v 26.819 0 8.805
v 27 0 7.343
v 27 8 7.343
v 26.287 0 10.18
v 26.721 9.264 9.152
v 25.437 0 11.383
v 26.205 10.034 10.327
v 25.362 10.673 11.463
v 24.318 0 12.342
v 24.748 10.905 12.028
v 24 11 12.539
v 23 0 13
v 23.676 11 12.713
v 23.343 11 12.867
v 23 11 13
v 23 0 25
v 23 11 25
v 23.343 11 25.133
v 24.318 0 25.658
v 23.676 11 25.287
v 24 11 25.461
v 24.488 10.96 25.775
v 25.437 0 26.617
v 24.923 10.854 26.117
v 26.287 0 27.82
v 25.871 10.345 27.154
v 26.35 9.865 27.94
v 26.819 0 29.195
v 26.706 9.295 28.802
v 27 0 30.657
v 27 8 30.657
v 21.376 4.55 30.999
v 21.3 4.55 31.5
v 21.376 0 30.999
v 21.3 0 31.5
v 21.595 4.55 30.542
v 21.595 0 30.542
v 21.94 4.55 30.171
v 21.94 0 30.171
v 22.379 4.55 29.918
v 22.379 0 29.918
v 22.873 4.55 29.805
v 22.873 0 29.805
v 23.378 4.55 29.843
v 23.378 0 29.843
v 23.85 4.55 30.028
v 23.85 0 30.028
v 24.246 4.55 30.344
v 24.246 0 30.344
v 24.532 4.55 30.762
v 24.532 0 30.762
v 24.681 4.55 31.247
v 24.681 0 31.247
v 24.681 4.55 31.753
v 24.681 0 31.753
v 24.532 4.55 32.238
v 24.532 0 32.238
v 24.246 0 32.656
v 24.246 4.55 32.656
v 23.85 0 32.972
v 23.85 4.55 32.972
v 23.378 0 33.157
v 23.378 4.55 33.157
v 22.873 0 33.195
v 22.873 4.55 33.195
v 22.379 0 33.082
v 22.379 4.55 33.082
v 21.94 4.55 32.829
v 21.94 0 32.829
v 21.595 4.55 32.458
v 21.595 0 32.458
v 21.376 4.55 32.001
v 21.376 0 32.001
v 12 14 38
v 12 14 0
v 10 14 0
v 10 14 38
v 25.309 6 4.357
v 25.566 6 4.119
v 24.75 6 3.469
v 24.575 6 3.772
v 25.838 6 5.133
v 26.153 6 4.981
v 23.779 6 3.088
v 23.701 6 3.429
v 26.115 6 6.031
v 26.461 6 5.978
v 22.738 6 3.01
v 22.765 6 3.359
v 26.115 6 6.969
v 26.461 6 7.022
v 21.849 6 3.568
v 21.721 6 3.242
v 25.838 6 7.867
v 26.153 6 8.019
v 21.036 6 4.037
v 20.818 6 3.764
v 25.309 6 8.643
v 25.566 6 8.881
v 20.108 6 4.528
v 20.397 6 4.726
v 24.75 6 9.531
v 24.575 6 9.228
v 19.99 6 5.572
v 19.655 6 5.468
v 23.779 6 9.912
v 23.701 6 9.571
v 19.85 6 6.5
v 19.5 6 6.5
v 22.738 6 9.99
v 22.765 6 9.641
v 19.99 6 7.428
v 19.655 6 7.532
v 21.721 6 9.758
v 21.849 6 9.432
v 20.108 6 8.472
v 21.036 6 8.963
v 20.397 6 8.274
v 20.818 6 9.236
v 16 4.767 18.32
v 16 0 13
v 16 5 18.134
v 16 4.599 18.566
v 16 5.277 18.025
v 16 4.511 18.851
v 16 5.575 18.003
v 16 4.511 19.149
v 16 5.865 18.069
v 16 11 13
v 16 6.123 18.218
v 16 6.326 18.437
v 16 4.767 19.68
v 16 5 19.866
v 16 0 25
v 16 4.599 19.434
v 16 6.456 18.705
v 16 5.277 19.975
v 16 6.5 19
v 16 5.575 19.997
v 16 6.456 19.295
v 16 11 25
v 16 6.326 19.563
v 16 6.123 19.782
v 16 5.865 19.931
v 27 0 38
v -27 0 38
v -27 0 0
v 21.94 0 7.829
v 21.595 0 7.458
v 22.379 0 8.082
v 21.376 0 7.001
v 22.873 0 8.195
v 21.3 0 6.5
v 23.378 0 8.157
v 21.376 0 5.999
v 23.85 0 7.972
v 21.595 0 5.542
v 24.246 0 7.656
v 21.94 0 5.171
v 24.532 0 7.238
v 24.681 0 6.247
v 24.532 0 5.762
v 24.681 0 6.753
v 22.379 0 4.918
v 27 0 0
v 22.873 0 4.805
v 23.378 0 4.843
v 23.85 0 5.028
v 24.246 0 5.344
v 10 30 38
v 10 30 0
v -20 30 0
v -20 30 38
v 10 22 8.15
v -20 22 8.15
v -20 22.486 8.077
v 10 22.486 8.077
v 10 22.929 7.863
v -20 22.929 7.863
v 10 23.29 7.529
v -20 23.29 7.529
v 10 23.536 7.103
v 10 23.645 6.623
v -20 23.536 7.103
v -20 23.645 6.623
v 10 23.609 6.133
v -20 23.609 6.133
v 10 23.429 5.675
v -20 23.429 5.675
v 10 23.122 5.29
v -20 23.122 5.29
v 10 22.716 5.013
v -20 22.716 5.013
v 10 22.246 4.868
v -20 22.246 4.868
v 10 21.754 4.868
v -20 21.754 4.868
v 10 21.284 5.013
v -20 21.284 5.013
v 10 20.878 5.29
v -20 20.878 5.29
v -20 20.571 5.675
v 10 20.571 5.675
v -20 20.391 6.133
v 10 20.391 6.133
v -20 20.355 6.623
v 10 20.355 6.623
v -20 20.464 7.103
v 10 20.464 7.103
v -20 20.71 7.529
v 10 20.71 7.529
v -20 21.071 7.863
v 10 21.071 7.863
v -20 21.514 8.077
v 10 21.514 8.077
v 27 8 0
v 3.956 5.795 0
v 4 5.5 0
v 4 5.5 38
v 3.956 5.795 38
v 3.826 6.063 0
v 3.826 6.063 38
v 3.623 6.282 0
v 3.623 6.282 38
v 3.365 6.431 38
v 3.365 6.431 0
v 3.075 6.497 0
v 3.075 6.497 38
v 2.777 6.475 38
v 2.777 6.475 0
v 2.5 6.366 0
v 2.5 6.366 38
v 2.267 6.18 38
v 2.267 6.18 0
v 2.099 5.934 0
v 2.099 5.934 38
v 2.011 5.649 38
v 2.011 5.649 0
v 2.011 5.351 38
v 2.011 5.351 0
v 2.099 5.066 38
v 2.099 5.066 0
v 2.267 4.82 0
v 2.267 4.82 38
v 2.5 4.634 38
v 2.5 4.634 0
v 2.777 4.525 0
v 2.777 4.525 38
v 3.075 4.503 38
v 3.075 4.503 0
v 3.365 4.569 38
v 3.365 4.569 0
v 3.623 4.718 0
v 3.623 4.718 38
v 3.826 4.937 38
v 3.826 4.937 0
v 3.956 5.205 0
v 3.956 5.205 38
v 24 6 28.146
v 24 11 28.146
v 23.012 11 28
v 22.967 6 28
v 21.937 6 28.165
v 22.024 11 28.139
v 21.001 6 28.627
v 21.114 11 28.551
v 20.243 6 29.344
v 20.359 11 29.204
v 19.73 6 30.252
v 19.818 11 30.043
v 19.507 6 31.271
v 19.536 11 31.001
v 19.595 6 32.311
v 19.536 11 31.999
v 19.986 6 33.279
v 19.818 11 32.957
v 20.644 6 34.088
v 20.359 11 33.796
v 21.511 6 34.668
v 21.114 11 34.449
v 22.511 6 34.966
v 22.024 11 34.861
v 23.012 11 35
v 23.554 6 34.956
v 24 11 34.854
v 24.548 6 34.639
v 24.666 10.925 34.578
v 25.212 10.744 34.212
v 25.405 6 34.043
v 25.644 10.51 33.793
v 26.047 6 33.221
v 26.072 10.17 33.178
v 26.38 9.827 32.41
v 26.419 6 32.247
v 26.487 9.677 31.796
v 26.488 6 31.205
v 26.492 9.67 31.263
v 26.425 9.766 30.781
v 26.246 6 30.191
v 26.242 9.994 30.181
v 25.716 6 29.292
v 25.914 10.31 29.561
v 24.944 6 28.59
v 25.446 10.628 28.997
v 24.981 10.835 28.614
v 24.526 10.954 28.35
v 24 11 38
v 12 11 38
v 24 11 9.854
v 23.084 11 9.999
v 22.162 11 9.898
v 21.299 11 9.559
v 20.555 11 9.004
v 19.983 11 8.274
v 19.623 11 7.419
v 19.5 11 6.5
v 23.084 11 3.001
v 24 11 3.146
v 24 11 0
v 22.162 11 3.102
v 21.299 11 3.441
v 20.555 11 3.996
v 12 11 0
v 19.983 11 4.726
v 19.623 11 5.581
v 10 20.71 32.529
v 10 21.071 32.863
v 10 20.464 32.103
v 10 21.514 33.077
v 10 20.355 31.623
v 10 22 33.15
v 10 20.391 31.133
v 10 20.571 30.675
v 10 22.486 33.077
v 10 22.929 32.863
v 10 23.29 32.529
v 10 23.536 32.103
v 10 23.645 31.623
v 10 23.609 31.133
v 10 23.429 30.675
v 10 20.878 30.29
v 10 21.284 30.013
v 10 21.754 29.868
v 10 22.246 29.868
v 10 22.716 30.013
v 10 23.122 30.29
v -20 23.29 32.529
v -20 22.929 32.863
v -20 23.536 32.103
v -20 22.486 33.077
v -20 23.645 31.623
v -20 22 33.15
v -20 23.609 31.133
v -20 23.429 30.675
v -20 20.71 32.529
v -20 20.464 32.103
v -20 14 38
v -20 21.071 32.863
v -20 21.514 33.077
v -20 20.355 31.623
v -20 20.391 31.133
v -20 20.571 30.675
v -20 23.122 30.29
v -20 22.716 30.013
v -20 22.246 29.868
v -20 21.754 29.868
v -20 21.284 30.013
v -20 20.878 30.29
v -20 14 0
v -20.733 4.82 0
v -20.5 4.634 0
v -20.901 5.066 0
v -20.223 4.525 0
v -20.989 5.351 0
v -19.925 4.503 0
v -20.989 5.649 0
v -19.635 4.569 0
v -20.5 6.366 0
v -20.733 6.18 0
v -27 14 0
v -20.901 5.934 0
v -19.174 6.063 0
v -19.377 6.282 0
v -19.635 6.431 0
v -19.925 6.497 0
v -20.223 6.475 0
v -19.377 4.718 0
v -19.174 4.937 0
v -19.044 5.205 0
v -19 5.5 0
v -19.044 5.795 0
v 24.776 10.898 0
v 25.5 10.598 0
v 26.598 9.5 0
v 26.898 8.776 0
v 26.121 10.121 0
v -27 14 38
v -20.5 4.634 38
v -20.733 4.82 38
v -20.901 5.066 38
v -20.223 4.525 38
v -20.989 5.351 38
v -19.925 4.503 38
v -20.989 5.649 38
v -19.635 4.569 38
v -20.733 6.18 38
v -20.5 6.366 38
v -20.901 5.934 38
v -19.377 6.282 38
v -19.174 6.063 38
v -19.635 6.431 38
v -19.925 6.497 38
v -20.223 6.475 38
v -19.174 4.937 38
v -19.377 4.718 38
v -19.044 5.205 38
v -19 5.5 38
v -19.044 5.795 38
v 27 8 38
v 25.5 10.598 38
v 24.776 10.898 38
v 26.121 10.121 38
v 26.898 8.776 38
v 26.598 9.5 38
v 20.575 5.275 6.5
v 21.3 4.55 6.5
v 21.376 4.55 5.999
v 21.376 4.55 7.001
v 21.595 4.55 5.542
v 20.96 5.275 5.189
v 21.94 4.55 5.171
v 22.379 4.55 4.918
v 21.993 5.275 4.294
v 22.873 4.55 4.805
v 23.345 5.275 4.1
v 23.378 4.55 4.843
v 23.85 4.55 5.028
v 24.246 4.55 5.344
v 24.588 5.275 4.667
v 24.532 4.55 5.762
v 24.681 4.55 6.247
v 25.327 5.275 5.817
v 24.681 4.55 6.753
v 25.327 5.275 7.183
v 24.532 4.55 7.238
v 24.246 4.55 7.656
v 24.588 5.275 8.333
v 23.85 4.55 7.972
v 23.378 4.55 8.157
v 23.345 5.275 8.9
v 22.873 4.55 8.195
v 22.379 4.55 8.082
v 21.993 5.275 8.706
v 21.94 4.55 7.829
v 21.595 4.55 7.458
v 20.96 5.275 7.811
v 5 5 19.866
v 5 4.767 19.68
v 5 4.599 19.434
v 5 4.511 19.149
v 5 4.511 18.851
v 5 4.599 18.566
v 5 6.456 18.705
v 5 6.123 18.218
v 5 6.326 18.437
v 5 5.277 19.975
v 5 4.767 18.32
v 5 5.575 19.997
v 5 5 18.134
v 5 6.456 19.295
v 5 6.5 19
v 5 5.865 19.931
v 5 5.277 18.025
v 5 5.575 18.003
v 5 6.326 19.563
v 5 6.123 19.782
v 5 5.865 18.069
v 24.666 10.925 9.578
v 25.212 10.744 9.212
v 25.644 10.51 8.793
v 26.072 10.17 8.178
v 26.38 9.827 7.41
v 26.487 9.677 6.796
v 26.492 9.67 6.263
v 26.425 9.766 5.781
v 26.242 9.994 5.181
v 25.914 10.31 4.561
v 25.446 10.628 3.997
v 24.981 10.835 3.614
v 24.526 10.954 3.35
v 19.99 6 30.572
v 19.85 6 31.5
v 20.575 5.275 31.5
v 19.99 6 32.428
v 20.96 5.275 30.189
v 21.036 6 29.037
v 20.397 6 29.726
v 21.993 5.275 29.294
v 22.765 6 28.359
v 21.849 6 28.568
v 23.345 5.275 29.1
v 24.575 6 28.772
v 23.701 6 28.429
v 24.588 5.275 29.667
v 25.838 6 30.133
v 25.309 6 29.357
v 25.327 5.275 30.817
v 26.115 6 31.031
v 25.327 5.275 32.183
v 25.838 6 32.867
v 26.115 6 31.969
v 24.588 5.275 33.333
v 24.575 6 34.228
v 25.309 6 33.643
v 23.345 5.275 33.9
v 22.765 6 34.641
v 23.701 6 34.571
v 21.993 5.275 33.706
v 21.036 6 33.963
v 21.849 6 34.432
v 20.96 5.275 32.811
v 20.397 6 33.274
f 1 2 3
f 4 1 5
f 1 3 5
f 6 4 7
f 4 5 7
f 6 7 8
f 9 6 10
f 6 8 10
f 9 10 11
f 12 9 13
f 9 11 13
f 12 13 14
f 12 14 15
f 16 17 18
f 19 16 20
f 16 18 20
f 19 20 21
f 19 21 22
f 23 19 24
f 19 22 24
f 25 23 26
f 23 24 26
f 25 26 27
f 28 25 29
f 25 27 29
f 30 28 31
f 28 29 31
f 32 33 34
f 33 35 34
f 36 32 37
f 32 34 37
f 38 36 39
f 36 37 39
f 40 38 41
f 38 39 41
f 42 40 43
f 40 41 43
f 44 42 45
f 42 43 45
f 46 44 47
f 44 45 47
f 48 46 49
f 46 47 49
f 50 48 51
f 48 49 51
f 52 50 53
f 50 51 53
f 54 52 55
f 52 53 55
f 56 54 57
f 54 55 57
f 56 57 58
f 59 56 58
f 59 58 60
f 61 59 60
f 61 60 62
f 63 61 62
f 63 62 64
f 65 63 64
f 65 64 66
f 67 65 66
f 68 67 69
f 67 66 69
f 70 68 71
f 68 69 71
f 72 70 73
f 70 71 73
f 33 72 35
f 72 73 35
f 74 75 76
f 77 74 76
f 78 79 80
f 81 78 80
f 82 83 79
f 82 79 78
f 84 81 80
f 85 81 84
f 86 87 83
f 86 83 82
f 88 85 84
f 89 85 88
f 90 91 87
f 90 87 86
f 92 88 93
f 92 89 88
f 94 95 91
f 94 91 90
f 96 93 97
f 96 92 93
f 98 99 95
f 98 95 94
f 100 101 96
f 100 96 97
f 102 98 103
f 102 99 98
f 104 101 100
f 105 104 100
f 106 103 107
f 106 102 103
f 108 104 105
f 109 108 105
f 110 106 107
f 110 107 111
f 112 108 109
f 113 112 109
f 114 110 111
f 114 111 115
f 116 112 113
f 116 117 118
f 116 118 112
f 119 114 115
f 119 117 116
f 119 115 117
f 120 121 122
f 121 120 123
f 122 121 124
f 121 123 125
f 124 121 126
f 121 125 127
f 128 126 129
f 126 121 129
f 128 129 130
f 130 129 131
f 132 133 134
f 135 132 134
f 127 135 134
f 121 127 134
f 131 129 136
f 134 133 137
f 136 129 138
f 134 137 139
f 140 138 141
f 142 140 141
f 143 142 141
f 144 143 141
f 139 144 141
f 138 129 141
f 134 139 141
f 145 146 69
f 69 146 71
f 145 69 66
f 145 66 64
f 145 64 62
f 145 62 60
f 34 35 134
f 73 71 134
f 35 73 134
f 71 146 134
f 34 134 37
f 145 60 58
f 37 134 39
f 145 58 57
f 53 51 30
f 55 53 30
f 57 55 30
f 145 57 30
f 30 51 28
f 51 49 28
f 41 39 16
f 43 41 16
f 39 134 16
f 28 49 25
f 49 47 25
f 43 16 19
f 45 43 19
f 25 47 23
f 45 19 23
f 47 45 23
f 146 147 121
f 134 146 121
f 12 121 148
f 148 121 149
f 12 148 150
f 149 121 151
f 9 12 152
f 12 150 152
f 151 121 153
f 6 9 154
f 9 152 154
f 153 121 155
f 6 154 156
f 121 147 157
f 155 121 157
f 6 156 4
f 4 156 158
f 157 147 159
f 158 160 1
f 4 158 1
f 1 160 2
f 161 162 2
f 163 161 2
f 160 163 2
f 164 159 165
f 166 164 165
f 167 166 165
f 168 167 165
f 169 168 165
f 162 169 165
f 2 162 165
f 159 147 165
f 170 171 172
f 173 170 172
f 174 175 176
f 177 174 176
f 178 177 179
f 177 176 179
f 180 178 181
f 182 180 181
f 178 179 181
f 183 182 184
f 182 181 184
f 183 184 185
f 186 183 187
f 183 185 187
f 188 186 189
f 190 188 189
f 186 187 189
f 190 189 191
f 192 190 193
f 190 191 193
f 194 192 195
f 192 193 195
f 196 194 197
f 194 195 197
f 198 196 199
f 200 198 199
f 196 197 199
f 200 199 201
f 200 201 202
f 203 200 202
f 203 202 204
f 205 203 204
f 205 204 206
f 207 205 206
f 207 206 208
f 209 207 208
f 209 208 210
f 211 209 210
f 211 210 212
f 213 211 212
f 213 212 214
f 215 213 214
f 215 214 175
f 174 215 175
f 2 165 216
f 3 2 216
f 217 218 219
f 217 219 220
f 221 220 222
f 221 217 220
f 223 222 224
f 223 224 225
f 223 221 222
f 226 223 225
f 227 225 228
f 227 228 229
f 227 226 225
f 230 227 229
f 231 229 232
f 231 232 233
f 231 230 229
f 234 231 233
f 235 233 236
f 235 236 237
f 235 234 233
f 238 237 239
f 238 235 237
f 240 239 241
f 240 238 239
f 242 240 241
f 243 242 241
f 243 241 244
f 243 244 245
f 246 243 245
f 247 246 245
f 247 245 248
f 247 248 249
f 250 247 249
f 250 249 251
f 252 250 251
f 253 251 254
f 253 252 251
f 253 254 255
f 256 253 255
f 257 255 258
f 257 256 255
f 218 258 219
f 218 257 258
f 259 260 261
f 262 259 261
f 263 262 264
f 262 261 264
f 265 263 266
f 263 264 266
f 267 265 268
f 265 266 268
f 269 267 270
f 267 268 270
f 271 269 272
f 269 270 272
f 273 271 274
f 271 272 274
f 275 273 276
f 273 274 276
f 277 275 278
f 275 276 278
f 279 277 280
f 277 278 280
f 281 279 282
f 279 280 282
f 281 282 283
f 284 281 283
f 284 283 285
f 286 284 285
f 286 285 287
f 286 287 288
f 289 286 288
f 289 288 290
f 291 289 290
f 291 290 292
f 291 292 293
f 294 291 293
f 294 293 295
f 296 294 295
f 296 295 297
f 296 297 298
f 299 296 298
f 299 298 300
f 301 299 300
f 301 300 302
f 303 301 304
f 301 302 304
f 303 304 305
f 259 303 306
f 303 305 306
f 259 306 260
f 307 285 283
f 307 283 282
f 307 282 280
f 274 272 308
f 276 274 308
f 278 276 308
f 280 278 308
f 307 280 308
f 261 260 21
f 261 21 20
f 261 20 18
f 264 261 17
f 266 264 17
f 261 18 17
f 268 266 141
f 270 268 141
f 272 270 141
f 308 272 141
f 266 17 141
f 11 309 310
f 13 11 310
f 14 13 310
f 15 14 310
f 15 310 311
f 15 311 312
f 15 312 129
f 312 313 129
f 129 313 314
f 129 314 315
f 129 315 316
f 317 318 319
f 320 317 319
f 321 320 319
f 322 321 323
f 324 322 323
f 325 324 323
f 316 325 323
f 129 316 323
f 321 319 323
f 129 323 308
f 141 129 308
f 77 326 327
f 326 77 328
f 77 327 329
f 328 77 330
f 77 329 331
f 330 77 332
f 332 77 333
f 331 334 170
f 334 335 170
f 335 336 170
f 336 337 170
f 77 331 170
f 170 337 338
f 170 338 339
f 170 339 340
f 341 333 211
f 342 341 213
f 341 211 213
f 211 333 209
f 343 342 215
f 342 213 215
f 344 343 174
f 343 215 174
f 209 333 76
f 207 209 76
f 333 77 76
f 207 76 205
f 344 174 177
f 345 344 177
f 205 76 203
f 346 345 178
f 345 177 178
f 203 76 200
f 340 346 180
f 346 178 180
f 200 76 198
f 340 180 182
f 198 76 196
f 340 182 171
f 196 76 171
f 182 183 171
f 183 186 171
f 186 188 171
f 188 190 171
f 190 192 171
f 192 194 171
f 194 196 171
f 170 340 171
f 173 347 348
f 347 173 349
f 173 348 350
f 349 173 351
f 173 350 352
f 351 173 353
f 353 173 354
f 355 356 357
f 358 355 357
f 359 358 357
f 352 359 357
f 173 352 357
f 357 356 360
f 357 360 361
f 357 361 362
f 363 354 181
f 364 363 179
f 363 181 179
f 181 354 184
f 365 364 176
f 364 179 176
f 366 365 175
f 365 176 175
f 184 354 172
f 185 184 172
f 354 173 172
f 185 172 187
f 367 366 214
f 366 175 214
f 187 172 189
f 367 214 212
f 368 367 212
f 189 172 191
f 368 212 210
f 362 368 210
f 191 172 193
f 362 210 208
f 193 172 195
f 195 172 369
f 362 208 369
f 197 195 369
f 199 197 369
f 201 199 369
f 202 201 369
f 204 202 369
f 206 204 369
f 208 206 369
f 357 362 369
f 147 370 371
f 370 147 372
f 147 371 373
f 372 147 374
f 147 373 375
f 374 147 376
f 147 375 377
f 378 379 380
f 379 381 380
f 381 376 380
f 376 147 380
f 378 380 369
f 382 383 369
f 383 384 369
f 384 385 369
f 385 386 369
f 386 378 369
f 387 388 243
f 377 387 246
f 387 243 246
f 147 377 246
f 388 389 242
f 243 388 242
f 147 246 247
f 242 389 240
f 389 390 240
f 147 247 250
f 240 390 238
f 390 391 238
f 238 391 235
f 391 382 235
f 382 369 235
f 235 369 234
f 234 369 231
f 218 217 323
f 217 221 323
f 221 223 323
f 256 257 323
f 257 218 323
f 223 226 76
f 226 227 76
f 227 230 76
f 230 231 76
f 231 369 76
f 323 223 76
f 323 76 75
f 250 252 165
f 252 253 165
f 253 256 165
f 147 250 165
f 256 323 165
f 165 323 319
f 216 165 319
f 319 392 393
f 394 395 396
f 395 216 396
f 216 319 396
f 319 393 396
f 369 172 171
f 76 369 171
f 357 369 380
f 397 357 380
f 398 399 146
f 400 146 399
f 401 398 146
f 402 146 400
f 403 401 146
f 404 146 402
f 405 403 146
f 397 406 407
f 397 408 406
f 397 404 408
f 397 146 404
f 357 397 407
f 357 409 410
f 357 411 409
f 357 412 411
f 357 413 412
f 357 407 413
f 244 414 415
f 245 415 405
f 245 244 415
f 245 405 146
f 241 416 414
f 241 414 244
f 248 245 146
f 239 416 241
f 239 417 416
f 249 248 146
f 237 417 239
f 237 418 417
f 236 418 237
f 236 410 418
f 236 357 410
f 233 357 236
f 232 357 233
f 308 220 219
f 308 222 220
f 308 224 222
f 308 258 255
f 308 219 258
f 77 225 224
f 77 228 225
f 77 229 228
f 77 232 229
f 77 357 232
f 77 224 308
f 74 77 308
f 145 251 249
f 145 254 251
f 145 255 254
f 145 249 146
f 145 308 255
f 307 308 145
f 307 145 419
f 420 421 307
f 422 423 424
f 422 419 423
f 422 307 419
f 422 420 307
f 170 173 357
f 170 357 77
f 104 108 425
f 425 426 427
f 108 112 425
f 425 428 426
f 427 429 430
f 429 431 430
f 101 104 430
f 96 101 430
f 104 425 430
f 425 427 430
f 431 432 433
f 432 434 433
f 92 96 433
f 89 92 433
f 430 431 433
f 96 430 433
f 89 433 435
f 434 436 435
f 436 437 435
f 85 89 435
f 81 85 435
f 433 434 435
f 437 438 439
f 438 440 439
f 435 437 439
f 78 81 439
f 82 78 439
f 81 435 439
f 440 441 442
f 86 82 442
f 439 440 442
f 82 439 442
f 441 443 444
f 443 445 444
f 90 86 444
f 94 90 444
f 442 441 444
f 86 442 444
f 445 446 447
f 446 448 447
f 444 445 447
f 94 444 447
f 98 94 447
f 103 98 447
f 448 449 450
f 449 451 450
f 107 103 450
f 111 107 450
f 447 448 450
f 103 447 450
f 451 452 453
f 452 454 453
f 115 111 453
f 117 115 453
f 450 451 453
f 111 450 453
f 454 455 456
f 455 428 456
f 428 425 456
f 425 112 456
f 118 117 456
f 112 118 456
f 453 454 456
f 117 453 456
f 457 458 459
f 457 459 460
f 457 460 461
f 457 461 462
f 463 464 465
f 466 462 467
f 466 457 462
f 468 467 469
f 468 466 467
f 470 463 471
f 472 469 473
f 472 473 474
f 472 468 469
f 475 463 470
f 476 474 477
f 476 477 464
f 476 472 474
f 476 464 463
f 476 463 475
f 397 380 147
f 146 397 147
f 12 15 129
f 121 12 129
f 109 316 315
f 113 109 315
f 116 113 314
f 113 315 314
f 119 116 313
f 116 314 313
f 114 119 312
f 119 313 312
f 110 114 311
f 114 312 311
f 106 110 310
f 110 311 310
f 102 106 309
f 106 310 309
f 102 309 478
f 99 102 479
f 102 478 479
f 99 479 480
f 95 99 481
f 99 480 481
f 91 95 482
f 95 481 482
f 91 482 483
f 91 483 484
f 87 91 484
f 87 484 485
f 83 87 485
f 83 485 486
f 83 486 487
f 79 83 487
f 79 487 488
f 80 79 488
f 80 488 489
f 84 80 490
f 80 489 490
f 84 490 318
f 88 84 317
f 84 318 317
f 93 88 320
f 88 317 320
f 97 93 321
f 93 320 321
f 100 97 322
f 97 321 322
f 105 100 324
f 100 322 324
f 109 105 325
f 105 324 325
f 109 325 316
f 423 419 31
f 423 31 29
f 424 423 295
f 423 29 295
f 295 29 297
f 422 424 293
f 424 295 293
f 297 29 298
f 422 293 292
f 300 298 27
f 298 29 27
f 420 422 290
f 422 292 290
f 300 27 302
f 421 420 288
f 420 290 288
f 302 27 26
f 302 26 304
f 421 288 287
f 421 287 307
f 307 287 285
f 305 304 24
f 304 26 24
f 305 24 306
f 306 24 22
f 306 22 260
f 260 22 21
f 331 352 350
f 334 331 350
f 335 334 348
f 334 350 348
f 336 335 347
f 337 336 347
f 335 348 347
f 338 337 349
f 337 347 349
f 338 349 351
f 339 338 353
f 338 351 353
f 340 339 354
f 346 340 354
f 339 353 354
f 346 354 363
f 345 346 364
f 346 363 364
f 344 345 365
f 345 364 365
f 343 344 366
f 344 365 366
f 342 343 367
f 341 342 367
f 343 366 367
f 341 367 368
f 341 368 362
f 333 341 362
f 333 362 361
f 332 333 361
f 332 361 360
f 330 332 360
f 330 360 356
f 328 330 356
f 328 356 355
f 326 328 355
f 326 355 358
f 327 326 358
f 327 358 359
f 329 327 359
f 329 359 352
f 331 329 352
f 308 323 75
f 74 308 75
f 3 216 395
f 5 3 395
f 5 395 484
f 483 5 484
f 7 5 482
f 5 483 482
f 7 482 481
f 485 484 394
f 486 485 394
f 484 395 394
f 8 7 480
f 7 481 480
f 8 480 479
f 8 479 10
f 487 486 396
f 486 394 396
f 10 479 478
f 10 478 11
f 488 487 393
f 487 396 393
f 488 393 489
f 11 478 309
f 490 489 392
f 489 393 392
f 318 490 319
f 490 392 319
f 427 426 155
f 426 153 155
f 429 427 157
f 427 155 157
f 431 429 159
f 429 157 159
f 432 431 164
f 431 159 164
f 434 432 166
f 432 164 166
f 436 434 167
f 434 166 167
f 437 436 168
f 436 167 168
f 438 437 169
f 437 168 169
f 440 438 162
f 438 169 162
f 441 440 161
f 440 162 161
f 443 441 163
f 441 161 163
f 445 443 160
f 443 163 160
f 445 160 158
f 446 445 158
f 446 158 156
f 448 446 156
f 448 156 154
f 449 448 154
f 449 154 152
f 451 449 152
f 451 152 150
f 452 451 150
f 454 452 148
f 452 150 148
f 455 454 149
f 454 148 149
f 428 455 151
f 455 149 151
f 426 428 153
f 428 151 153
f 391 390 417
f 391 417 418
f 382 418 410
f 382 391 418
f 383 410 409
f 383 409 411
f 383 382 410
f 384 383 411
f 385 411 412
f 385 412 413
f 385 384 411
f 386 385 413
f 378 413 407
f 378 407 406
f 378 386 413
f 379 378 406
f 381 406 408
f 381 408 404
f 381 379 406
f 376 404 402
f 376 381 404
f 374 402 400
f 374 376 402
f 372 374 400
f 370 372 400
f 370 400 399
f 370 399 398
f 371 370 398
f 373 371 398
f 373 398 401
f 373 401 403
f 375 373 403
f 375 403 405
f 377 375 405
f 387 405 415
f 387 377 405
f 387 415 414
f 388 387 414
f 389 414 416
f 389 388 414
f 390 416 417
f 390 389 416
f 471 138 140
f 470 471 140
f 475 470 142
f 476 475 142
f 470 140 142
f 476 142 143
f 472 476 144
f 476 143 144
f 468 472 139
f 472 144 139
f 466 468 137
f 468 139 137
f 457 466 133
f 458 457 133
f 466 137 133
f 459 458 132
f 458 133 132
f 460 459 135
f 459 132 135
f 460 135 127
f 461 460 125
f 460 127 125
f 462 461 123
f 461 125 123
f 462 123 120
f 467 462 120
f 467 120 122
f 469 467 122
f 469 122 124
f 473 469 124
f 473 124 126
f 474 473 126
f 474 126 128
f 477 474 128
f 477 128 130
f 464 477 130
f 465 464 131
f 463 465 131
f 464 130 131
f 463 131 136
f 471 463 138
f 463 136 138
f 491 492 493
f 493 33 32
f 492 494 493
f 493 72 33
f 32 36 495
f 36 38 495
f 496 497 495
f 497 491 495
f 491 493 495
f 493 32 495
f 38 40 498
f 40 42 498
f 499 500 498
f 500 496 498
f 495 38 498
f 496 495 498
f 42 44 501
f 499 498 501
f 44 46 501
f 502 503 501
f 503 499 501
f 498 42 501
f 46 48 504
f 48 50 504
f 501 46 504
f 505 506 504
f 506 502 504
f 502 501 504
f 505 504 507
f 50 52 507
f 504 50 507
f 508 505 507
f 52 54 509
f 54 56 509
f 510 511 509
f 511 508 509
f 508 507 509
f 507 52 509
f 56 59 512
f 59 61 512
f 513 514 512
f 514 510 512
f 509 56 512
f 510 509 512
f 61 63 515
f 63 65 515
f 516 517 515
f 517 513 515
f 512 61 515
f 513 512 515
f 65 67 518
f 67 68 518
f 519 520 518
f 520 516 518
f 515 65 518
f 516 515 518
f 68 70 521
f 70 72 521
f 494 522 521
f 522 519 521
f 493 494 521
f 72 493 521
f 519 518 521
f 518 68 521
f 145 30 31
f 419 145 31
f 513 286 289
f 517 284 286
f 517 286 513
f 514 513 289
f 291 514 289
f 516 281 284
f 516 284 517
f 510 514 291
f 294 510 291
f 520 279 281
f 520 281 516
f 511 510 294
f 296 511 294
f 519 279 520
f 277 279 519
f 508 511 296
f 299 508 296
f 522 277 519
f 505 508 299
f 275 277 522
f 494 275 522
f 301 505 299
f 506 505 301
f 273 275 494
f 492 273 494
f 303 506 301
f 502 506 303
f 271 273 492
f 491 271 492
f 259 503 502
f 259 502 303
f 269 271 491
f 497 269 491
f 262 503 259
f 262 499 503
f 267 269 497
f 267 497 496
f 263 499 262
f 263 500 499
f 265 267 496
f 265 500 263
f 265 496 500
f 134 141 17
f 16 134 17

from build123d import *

# Parameters (mm, degrees)
SKETCH_28_R                  = 1
EXTRUDE_4469_DEPTH           = 38
CUT_EXTRUDE_4687_REACH       = 69.476
SKETCH_29_R                  = 1.65
CUT_EXTRUDE_4925_DEPTH       = 51.338851795
FILLET_9_R                   = 3
SKETCH_31_R                  = 1
CUT_EXTRUDE_5310_DEPTH       = 11
SKETCH_32_R                  = 3.5
CUT_EXTRUDE_5556_DEPTH       = 5
HOLE_WIZARD_5601_D           = 3.4
HOLE_WIZARD_5601_CSINK_D     = 6.3
HOLE_WIZARD_5601_CSINK_ANGLE = 90


with BuildPart() as part:
    # Эскиз28 → Extrude 4469 (new body)
    with BuildSketch(Plane.XY):
        Polygon((27, 0), (27, 11), (12, 11), (12, 14), (10, 14), (10, 30), (-20, 30), (-20, 14), (-27, 14), (-27, 11), (-27, 0), align=None)
        with Locations((3, 5.5)):
            Circle(SKETCH_28_R, mode=Mode.SUBTRACT)
        with Locations((-20, 5.5)):
            Circle(SKETCH_28_R, mode=Mode.SUBTRACT)
    extrude(amount=EXTRUDE_4469_DEPTH)

    # Эскиз29 → Cut-Extrude 4687 (cut, up to next)
    with BuildSketch(Plane.ZY.offset(20), mode=Mode.PRIVATE) as cut_extrude_4687_sk1:
        with Locations((6.5, 22)):
            Circle(SKETCH_29_R)
    cut_extrude_4687_tool1 = extrude(cut_extrude_4687_sk1.sketch, amount=-CUT_EXTRUDE_4687_REACH, mode=Mode.PRIVATE) & part.part
    # Эскиз29 → Cut-Extrude 4687 (cut, up to next)
    with BuildSketch(Plane.ZY.offset(20), mode=Mode.PRIVATE) as cut_extrude_4687_sk2:
        with Locations((31.5, 22)):
            Circle(SKETCH_29_R)
    cut_extrude_4687_tool2 = extrude(cut_extrude_4687_sk2.sketch, amount=-CUT_EXTRUDE_4687_REACH, mode=Mode.PRIVATE) & part.part
    add(cut_extrude_4687_tool1.solids().sort_by_distance((-20, 22, 6.5))[0], mode=Mode.SUBTRACT)
    add(cut_extrude_4687_tool2.solids().sort_by_distance((-20, 22, 31.5))[0], mode=Mode.SUBTRACT)

    # Эскиз30 → Cut-Extrude 4925 (cut, through all)
    with BuildSketch(Plane(origin=(0, 11, 0), x_dir=(1, 0, 0), z_dir=(0, 1, 0))):
        with BuildLine():
            Line((23, -13), (16, -13))
            Line((16, -13), (16, -25))
            Line((16, -25), (23, -25))
            ThreePointArc((23, -25), (25.898979486, -27.192752634), (27, -30.656854249))
            Line((27, -30.656854249), (27, -7.343145751))
            ThreePointArc((27, -7.343145751), (25.898979486, -10.807247366), (23, -13))
        make_face()
    extrude(amount=-CUT_EXTRUDE_4925_DEPTH, mode=Mode.SUBTRACT)

    # Скругление9
    # the kernel refuses this fillet: 3 mm, written as the material it takes off along each edge
    with BuildSketch(Plane(origin=(27, 11, 23.156854249), x_dir=(-1, 0, 0), z_dir=(0, 0, 1))) as fillet_9_piece_1:
        with BuildLine():
            CenterArc((FILLET_9_R, FILLET_9_R), FILLET_9_R, 180, 90)
            Line((0, FILLET_9_R), (0, 0))
            Line((0, 0), (FILLET_9_R, 0))
        make_face()
    extrude(amount=22.343145751, mode=Mode.SUBTRACT)
    with BuildSketch(Plane(origin=(27, 11, -7.5), x_dir=(0, -1, 0), z_dir=(0, 0, 1))) as fillet_9_piece_2:
        with BuildLine():
            CenterArc((FILLET_9_R, -FILLET_9_R), FILLET_9_R, 90, 90)
            Line((0, -FILLET_9_R), (0, 0))
            Line((0, 0), (FILLET_9_R, 0))
        make_face()
    extrude(amount=22.343145751, mode=Mode.SUBTRACT)

    # Эскиз31 → Cut-Extrude 5310 (cut)
    with BuildSketch(Plane(origin=(16, 0, 0), x_dir=(0, 0, -1), z_dir=(1, 0, 0))):
        with Locations(Location((-19, 5.5, 0), (0, 0, 90))):
            Circle(SKETCH_31_R)
    extrude(amount=-CUT_EXTRUDE_5310_DEPTH, mode=Mode.SUBTRACT)

    # Эскиз32 → Cut-Extrude 5556 (cut)
    with BuildSketch(Plane(origin=(0, 11, 0), x_dir=(1, 0, 0), z_dir=(0, 1, 0))):
        with Locations(Location((23, -6.5, 0), (0, 0, 180))):
            Circle(SKETCH_32_R)
        with Locations(Location((23, -31.5, 0), (0, 0, 73.398450401))):
            Circle(SKETCH_32_R)
    extrude(amount=-CUT_EXTRUDE_5556_DEPTH, mode=Mode.SUBTRACT)

    # Hole Wizard 5601 (through all)
    with Locations(Plane(origin=(0, 6, 0), x_dir=(1, 0, 0), z_dir=(0, 1, 0))):
        with Locations((23, -6.5), (23, -31.5)):
            CounterSinkHole(HOLE_WIZARD_5601_D / 2, HOLE_WIZARD_5601_CSINK_D / 2, counter_sink_angle=HOLE_WIZARD_5601_CSINK_ANGLE)


solid = part.part
